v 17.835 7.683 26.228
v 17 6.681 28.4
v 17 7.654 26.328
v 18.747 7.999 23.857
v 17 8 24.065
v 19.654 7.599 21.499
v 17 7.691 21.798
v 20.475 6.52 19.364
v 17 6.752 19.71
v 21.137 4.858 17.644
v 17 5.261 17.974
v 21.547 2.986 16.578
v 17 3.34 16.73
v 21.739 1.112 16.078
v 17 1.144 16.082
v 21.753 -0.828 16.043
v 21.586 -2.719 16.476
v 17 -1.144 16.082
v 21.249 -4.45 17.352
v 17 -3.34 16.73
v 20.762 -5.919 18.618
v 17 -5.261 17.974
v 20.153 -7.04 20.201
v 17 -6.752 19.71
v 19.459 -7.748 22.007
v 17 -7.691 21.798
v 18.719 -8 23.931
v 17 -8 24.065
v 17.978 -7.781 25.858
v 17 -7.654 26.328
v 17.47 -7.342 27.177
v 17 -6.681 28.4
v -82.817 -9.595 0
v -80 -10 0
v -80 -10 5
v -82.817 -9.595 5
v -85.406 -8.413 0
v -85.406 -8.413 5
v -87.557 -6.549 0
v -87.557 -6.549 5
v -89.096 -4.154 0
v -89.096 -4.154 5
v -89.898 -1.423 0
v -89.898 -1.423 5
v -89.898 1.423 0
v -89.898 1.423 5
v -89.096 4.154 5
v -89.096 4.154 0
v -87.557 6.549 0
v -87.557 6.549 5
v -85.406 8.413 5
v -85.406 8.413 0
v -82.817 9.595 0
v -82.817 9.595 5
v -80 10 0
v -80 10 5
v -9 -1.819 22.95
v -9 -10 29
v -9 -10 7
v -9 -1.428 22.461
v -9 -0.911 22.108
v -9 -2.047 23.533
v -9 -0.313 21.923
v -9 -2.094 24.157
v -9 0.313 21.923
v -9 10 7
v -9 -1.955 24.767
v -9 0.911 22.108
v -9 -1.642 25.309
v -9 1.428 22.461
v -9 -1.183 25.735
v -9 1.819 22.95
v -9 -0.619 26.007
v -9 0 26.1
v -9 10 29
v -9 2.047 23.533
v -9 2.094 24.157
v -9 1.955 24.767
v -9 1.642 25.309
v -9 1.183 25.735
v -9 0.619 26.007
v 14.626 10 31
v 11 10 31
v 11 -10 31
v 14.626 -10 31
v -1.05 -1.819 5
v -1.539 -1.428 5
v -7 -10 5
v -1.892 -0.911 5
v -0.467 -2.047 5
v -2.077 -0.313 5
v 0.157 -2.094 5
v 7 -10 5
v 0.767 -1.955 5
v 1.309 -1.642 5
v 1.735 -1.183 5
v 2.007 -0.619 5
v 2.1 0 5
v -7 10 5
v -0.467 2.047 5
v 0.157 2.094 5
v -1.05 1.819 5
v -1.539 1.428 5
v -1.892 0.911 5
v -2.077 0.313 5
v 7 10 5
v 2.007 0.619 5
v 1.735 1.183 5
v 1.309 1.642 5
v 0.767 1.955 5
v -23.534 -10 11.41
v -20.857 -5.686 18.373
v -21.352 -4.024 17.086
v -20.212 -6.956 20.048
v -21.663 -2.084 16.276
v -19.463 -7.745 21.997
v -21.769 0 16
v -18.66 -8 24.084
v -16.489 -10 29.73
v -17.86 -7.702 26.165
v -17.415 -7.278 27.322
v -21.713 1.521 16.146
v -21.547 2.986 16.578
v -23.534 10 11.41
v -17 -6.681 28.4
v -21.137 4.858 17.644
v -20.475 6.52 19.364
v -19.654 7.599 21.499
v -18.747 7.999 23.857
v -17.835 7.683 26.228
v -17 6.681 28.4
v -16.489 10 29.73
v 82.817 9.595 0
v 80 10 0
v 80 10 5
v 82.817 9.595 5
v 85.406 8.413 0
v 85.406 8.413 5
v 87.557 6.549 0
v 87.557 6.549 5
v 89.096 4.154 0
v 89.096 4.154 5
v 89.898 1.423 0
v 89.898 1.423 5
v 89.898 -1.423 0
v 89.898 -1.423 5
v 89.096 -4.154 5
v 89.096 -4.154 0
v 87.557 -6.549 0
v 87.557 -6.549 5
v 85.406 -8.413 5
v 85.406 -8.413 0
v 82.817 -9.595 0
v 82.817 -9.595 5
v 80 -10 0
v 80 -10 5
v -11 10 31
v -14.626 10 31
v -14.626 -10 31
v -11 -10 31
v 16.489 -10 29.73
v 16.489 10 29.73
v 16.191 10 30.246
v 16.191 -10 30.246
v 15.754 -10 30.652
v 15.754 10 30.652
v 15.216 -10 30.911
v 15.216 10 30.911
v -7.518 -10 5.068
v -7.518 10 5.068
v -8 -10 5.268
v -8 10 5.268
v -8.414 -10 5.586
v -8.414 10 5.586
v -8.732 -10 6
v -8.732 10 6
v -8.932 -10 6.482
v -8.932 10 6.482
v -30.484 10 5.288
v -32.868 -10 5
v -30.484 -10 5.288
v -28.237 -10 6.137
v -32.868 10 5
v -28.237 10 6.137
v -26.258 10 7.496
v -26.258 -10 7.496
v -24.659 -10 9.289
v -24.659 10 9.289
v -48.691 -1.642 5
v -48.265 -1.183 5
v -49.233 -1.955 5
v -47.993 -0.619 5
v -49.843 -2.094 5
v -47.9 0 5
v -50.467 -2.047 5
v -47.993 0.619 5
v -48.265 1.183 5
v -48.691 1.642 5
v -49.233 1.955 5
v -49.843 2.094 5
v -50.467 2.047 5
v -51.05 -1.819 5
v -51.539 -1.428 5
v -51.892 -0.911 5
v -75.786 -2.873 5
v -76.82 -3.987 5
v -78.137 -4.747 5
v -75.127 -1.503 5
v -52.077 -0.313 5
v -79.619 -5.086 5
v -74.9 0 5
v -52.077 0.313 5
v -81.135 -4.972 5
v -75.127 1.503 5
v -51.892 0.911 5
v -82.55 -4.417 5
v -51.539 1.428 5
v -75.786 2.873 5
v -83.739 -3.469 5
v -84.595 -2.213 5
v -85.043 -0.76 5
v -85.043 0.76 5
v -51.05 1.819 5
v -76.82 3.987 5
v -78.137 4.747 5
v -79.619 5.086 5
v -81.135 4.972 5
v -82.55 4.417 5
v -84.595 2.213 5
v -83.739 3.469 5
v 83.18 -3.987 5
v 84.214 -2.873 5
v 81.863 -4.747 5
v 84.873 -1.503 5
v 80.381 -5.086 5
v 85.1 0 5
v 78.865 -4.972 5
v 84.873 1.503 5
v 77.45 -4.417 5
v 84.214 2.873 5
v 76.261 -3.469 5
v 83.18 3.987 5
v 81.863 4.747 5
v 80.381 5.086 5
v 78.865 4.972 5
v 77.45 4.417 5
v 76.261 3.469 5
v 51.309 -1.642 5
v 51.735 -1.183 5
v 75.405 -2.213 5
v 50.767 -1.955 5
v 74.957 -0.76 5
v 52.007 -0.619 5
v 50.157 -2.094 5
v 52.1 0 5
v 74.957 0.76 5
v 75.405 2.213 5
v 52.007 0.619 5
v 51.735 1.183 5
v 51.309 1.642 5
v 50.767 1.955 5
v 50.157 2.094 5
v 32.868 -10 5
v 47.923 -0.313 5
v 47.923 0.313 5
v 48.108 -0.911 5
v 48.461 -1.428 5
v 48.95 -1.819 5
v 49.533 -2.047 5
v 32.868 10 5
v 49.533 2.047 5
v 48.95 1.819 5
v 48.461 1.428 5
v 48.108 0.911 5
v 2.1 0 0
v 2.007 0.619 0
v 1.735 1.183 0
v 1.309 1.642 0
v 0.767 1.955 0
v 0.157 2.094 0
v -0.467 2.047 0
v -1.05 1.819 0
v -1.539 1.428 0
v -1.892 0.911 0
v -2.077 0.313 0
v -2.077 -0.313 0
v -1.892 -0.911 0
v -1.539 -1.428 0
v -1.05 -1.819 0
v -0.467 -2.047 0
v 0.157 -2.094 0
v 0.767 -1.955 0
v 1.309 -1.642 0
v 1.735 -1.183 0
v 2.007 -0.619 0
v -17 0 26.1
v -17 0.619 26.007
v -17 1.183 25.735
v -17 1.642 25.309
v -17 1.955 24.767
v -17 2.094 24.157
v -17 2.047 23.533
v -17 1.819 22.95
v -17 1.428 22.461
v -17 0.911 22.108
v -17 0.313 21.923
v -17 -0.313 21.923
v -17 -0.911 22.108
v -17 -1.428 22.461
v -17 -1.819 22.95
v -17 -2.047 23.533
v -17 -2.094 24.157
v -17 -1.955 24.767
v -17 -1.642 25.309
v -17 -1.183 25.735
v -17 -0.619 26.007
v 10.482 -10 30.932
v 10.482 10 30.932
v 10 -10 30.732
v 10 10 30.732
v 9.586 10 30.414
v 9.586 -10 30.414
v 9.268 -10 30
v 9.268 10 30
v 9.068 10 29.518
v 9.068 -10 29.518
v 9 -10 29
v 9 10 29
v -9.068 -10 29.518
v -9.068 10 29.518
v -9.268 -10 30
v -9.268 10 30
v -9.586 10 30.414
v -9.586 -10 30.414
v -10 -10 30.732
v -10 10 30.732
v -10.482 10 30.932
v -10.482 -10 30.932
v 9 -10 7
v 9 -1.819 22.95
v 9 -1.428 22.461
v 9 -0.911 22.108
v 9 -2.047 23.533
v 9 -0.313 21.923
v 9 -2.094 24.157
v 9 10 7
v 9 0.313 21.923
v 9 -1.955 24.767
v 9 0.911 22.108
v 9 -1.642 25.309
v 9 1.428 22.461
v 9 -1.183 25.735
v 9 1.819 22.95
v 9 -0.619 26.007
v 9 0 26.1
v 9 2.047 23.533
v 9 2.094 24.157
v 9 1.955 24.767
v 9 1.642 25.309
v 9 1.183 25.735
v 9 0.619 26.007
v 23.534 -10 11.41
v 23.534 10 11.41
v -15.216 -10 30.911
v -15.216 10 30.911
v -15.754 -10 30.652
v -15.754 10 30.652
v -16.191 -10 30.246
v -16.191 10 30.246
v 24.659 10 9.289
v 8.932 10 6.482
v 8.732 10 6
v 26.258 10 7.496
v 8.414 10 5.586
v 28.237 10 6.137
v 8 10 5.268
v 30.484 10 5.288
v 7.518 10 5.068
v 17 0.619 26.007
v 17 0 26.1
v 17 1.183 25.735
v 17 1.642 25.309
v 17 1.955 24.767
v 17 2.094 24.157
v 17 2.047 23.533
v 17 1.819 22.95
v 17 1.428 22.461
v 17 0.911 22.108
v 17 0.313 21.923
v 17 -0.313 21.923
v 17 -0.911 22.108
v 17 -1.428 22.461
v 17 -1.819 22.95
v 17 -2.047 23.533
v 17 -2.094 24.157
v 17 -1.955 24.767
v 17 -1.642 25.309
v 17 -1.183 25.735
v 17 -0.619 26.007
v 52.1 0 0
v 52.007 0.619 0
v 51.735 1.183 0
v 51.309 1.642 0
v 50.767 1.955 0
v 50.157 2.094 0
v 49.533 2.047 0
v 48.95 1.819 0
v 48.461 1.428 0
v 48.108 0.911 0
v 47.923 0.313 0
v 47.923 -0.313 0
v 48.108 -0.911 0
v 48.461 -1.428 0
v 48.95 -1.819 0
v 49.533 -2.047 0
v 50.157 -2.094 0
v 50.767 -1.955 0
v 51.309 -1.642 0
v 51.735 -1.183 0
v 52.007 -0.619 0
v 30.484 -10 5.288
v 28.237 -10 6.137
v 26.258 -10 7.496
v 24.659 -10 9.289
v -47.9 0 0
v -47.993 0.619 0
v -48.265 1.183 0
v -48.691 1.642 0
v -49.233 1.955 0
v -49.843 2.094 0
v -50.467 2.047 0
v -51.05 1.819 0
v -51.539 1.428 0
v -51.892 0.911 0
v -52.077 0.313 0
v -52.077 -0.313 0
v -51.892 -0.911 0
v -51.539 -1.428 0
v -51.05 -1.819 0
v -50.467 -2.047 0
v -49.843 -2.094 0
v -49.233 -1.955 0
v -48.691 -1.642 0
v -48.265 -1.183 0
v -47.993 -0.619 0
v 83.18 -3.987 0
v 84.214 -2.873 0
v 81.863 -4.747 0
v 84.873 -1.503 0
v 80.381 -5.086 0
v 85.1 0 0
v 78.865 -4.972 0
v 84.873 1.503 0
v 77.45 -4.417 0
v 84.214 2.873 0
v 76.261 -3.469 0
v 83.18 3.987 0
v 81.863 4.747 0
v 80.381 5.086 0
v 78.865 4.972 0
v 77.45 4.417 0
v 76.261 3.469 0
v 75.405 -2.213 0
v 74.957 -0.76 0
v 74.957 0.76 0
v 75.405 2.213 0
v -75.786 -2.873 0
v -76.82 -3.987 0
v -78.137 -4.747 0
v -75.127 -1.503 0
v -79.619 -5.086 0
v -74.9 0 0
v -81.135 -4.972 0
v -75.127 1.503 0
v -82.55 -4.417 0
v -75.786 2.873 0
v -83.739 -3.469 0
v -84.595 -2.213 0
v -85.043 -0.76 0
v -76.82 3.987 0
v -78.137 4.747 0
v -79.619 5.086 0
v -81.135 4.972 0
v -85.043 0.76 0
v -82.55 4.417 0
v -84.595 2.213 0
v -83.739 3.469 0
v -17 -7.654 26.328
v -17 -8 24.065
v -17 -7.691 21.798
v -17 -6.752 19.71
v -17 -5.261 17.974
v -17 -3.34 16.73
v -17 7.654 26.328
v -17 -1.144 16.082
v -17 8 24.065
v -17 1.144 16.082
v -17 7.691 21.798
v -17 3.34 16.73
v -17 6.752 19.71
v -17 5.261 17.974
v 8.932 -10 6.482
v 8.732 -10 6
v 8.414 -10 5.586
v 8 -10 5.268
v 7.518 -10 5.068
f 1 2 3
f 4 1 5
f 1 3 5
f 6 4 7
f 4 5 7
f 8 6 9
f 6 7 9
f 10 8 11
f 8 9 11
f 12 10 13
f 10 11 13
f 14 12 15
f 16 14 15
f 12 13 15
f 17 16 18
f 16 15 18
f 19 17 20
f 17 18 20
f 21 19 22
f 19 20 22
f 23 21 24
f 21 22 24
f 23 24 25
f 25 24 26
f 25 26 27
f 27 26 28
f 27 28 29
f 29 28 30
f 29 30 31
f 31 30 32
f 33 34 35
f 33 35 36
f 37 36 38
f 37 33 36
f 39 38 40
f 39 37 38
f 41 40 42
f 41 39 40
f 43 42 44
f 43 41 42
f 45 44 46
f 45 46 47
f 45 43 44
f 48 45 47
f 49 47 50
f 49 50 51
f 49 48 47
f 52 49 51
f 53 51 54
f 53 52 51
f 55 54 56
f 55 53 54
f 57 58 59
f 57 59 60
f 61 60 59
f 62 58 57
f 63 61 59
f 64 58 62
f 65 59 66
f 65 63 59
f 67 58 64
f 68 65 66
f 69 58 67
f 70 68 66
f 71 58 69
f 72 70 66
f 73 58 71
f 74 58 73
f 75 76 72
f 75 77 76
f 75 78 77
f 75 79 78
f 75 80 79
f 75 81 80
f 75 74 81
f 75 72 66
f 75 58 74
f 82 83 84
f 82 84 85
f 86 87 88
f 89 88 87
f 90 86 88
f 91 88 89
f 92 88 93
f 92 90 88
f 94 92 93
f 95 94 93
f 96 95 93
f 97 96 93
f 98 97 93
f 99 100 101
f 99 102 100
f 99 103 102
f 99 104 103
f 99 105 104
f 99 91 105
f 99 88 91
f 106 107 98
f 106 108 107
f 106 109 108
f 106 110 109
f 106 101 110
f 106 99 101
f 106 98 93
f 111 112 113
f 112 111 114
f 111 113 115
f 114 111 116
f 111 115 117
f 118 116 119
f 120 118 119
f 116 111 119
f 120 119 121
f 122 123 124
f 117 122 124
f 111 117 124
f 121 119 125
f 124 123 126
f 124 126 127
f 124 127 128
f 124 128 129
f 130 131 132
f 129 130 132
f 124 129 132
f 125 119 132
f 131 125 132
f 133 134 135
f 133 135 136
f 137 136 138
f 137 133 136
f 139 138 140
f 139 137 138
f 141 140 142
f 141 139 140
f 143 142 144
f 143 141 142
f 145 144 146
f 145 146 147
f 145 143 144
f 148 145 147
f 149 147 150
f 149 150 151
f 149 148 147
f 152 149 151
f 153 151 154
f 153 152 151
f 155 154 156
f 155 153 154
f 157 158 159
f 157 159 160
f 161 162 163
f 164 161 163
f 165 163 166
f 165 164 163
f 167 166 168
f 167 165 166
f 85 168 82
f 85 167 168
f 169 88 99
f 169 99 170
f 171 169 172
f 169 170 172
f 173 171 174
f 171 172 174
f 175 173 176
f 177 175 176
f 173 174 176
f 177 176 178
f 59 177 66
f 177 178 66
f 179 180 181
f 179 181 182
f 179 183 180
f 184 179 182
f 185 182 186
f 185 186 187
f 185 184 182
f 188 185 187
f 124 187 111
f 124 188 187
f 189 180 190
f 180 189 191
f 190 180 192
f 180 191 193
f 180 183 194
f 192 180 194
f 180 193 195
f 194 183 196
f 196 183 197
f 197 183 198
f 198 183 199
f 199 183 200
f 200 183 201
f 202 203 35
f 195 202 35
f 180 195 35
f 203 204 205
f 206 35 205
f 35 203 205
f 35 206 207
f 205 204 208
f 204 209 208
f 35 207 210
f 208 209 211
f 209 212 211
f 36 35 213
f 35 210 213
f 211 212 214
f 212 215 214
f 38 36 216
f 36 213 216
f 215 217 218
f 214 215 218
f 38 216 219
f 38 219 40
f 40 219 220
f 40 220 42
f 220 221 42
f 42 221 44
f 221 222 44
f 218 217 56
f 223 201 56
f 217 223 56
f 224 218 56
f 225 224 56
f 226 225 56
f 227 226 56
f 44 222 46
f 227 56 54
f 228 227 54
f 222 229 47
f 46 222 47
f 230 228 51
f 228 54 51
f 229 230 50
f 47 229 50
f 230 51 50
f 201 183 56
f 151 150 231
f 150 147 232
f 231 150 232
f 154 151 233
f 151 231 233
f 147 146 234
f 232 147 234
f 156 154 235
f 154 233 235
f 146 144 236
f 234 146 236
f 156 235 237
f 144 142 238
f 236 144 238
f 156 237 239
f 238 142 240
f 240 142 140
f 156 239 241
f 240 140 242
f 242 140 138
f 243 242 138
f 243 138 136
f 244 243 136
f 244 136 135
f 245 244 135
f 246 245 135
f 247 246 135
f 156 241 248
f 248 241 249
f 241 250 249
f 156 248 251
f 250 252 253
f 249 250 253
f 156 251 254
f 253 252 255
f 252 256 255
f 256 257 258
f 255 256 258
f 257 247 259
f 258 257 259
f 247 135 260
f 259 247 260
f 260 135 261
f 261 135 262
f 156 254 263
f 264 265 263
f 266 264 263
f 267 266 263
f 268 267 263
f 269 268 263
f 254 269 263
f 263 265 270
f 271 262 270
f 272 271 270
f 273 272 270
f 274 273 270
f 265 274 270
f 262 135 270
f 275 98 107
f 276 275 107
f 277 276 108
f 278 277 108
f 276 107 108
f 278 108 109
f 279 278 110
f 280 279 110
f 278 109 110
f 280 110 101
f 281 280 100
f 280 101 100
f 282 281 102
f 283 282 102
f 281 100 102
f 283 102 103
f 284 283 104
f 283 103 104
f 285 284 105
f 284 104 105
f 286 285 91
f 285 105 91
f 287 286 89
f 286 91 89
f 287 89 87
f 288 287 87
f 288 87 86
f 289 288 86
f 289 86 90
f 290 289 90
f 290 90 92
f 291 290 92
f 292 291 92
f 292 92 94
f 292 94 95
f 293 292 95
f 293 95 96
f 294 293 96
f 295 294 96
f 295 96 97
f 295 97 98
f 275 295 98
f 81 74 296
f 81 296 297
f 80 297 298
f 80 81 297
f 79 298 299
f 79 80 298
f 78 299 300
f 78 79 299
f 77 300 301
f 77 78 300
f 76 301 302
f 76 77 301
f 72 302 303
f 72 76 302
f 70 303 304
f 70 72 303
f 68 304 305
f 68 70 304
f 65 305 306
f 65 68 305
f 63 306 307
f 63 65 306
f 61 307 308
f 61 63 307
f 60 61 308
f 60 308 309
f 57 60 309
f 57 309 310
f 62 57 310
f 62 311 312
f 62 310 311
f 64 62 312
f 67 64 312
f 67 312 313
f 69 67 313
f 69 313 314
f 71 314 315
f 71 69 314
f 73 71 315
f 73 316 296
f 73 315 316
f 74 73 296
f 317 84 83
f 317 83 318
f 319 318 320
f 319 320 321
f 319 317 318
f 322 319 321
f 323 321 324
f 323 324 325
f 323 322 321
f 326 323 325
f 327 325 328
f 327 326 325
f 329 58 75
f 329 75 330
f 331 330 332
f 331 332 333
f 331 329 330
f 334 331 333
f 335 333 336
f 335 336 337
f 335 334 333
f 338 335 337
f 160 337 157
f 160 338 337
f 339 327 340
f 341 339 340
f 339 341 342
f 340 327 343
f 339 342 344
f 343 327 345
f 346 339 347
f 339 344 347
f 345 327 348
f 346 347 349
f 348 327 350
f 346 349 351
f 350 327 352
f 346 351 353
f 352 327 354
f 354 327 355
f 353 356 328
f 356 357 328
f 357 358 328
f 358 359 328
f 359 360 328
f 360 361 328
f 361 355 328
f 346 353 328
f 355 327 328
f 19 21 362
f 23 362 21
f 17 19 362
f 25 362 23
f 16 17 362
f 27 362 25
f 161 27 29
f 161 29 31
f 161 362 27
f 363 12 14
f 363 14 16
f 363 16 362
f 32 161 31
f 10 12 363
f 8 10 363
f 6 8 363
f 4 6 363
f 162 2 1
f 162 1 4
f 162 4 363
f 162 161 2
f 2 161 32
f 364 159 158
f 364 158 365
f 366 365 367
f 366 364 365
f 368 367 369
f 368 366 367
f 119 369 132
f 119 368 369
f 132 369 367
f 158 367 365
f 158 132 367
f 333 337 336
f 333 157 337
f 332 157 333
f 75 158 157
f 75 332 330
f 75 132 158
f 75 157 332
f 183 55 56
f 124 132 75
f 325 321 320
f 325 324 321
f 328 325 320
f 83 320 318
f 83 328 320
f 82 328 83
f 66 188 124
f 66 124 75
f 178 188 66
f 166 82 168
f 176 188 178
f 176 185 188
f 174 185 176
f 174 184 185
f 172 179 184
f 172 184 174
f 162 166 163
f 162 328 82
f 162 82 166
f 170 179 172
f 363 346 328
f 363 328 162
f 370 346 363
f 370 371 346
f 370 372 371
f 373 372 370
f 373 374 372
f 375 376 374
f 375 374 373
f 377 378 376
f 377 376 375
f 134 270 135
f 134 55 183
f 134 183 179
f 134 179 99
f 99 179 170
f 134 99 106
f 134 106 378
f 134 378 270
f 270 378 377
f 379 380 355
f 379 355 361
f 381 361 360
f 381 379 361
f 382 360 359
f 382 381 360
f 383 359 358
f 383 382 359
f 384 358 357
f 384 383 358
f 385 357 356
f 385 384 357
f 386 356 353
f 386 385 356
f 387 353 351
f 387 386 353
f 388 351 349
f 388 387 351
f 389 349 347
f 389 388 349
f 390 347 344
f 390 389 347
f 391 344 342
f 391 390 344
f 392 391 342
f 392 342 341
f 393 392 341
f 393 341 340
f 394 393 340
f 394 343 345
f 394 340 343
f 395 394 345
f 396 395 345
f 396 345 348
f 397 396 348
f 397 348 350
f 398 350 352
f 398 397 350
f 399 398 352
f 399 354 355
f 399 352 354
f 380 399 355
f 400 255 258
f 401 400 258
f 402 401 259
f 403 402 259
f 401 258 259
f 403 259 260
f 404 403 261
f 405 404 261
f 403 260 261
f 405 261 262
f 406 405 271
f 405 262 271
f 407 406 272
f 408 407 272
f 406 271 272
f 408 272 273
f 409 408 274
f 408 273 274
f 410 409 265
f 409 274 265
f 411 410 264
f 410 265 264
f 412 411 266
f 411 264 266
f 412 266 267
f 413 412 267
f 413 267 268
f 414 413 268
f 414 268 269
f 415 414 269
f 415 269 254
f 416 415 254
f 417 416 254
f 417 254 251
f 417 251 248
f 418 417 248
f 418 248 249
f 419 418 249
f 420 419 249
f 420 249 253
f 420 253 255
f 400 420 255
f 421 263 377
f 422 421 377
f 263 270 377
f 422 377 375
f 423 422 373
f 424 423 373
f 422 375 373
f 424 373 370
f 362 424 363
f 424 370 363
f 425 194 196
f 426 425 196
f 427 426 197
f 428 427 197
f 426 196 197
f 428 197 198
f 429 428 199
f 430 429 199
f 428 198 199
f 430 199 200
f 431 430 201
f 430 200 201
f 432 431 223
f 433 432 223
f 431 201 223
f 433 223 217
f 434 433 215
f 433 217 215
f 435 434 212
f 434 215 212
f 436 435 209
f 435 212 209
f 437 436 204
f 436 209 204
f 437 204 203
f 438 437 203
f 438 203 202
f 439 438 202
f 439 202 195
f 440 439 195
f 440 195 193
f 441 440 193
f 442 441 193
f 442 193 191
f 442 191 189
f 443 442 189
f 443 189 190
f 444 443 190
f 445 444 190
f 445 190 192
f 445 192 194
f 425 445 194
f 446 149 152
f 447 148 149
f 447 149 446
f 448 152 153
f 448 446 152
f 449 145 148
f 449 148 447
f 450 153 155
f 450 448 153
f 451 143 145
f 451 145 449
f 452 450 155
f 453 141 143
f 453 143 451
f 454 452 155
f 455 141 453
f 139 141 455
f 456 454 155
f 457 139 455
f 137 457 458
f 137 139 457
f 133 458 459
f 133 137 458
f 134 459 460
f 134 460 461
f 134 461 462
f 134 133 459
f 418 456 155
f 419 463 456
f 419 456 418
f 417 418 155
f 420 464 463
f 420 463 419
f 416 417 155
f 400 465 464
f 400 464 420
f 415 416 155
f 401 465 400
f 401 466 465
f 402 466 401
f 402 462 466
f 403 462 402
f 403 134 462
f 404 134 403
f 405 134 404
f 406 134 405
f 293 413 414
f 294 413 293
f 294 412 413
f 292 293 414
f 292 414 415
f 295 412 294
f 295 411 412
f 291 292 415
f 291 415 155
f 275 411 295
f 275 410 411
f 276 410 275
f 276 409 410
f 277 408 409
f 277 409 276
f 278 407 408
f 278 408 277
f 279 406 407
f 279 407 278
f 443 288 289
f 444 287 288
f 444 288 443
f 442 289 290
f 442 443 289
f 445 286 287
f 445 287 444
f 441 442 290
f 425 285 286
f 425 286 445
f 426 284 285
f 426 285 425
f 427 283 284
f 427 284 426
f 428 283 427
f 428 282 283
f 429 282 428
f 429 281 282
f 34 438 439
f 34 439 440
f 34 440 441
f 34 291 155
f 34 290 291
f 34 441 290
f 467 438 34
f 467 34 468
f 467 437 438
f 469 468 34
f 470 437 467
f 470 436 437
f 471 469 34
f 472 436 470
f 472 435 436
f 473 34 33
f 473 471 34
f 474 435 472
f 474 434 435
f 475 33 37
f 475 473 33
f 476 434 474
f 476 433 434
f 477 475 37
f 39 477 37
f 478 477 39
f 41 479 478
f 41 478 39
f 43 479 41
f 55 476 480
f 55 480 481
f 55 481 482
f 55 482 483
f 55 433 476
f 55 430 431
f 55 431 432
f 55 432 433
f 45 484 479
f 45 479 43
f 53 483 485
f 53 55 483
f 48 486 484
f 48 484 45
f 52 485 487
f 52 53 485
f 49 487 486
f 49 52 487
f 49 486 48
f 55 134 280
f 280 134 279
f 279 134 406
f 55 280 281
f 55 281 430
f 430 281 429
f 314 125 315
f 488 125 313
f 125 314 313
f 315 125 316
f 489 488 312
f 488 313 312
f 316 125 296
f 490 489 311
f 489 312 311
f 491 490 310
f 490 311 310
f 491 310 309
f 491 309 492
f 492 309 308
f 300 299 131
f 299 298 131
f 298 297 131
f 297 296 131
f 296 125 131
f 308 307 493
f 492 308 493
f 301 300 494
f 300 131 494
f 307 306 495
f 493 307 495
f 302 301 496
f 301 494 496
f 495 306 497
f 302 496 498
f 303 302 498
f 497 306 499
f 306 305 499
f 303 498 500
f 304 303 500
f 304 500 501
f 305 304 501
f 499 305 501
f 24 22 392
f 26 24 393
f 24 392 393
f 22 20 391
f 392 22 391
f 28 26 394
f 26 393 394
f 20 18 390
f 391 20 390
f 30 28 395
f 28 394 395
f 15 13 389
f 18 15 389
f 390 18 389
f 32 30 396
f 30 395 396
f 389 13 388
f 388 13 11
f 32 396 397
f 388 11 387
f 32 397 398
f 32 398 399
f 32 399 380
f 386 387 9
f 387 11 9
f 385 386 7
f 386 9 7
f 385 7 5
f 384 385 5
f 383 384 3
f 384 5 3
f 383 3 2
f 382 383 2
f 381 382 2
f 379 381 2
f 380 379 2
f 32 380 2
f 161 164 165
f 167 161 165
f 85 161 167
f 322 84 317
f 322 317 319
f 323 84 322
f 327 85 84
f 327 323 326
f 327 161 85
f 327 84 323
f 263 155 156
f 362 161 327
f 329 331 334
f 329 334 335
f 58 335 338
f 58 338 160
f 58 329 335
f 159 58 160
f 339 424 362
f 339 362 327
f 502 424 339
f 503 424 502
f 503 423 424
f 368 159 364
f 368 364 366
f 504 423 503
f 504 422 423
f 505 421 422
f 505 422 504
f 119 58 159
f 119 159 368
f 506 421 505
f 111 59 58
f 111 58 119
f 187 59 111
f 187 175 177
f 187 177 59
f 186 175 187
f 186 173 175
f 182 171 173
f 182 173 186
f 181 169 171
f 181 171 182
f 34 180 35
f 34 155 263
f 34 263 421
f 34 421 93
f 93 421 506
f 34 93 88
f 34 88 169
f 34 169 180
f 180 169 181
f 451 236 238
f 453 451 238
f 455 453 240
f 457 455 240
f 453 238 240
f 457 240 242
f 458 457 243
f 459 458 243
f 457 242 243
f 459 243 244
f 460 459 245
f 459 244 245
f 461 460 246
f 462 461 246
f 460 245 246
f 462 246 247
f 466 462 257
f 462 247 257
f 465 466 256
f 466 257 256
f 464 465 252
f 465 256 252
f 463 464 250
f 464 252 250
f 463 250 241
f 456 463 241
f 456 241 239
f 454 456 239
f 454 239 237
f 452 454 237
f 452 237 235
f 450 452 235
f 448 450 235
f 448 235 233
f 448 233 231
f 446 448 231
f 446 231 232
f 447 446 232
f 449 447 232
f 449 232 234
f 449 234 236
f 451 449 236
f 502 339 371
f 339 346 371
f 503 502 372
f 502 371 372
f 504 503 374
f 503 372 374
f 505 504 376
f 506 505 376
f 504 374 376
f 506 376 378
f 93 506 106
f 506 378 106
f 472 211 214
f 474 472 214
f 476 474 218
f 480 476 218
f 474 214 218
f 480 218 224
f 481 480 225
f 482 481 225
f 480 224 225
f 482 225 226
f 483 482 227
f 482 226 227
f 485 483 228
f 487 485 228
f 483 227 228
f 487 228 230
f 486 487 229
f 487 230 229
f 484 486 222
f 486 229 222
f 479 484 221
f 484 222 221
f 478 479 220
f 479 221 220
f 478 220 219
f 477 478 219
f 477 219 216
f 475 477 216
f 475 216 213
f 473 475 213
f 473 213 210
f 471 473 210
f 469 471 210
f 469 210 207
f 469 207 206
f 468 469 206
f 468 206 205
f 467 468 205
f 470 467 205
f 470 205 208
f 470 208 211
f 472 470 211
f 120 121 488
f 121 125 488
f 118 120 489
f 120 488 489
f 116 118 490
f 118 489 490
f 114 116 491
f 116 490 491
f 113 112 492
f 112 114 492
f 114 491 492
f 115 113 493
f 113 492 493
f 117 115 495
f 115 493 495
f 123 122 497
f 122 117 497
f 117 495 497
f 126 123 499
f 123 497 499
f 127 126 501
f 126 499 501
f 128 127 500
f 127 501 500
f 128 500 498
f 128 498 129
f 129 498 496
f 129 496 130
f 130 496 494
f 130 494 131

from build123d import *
from OCP.BRepFilletAPI import BRepFilletAPI_MakeChamfer

# Parameters (mm, degrees)
BOSS_EXTRU_1_DEPTH           = 5
ESQUISSE2_R                  = 5.1
ESQUISSE2_R_2                = 2.1
ENL_V_MAT_EXTRU_1_DEPTH      = 91.691785736
ESQUISSE3_W                  = 32
ESQUISSE3_H                  = 20
BOSS_EXTRU_2_DEPTH           = 26
CHANFREIN1_SIZE              = 10
CHANFREIN1_SIZE_2            = 26
CONG_1_R                     = 10
ESQUISSE4_W                  = 18
ESQUISSE4_H                  = 20
ENL_V_MAT_EXTRU_2_DEPTH      = 26
CONG_2_R                     = 2
ENL_V_MAT_EXTRU_3_DEPTH      = 105.220919205
ENL_V_MAT_EXTRU_3_DEPTH_BACK = 105.220919205
ESQUISSE5_R                  = 2.1
ENL_V_START                  = -8
ESQUISSE6_R                  = 8
ENL_V_MAT_EXTRU_4_DEPTH      = 26
ESQUISSE7_R                  = 8
ENL_V_MAT_EXTRU_5_DEPTH      = 97.220919205
CONG_3_START                 = -11
CONG_3_DEPTH                 = 22
SKETCH1_R                    = 2.1
CUT_EXTRUDE1_DEPTH           = 95.212525707


with BuildPart() as part:
    # Esquisse1 → Boss.-Extru.1 (new body)
    with BuildSketch(Plane.XY):
        with BuildLine():
            Line((-80, 10), (80, 10))
            ThreePointArc((80, 10), (90, 0), (80, -10))
            Line((80, -10), (-80, -10))
            ThreePointArc((-80, -10), (-90, 0), (-80, 10))
        make_face()
    extrude(amount=BOSS_EXTRU_1_DEPTH)

    # Esquisse2 → Enlèv. mat.-Extru.1 (cut, through all)
    with BuildSketch(Plane.XY.offset(5)):
        with Locations((-80, 0)):
            Circle(ESQUISSE2_R)
        with Locations((80, 0)):
            Circle(ESQUISSE2_R)
        with Locations((-50, 0)):
            Circle(ESQUISSE2_R_2)
        with Locations((50, 0)):
            Circle(ESQUISSE2_R_2)
    extrude(amount=-ENL_V_MAT_EXTRU_1_DEPTH, mode=Mode.SUBTRACT)

    # Esquisse3 → Boss.-Extru.2 (add)
    with BuildSketch(Plane.XY.offset(5)):
        Rectangle(ESQUISSE3_W, ESQUISSE3_H)
    extrude(amount=BOSS_EXTRU_2_DEPTH)

    # Chanfrein1
    chanfrein1_edges_1 = [part.edges().sort_by_distance(p)[0] for p in [
        (16, 0, 5),
    ]]
    chanfrein1_side_1 = [part.faces().sort_by_distance(p)[0] for p in [
        (16.2, 0, 5),
    ]]
    chanfrein1_edges_2 = [part.edges().sort_by_distance(p)[0] for p in [
        (-16, 0, 5),
    ]]
    chanfrein1_side_2 = [part.faces().sort_by_distance(p)[0] for p in [
        (-16.2, 0, 5),
    ]]
    chanfrein1 = BRepFilletAPI_MakeChamfer(part.part.solid().wrapped)
    for e in chanfrein1_edges_1:
        chanfrein1.Add(CHANFREIN1_SIZE - 0.0001, CHANFREIN1_SIZE_2 - 0.0001, e.wrapped, chanfrein1_side_1[0].wrapped)
    for e in chanfrein1_edges_2:
        chanfrein1.Add(CHANFREIN1_SIZE - 0.0001, CHANFREIN1_SIZE_2 - 0.0001, e.wrapped, chanfrein1_side_2[0].wrapped)
    add(Compound.cast(chanfrein1.Shape()), mode=Mode.REPLACE)  # a hair under: the kernel refuses the full size

    # Congé1
    cong_1_edges = [part.edges().sort_by_distance(p)[0] for p in [
        (25.9999, 0, 5),
        (-25.9999, 0, 5),
    ]]
    fillet(cong_1_edges, radius=CONG_1_R)

    # Esquisse4 → Enlèv. mat.-Extru.2 (cut)
    with BuildSketch(Plane.XY.offset(31)):
        Rectangle(ESQUISSE4_W, ESQUISSE4_H)
    extrude(amount=-ENL_V_MAT_EXTRU_2_DEPTH, mode=Mode.SUBTRACT)

    # Congé2
    cong_2_edges = [part.edges().sort_by_distance(p)[0] for p in [
        (9, 0, 5),
        (-9, 0, 5),
    ]]
    fillet(cong_2_edges, radius=CONG_2_R)

    # Esquisse5 → Enlèv. mat.-Extru.3 (cut, two sides: drawn at the far end of the back side and taken through both)
    with BuildSketch(Plane.ZY.offset(-9).offset(-ENL_V_MAT_EXTRU_3_DEPTH_BACK)):
        with Locations((24, 0)):
            Circle(ESQUISSE5_R)
    extrude(amount=ENL_V_MAT_EXTRU_3_DEPTH + ENL_V_MAT_EXTRU_3_DEPTH_BACK, mode=Mode.SUBTRACT)

    # Esquisse6 → Enlèv. mat.-Extru.4 (cut)
    with BuildSketch(Plane.ZY.offset(-9).offset(ENL_V_START)):
        with Locations((24, 0)):
            Circle(ESQUISSE6_R)
    extrude(amount=-ENL_V_MAT_EXTRU_4_DEPTH, mode=Mode.SUBTRACT)

    # Esquisse7 → Enlèv. mat.-Extru.5 (cut, through all)
    with BuildSketch(Plane(origin=(-9, 0, 0), x_dir=(0, 0, -1), z_dir=(1, 0, 0)).offset(ENL_V_START)):
        with Locations((-24, 0)):
            Circle(ESQUISSE7_R)
    extrude(amount=-ENL_V_MAT_EXTRU_5_DEPTH, mode=Mode.SUBTRACT)

    # Congé3: read off the stored shape, not the designer's step
    # Congé3 outline → Congé3 (cut)
    with BuildSketch(Plane(origin=(0, 0, 0), x_dir=(1, 0, 0), z_dir=(0, 1, 0)).offset(CONG_3_START)):
        with BuildLine():
            Line((-9, -31), (-9, -29))
            ThreePointArc((-9, -29), (-9.585786438, -30.414213562), (-11, -31))
            Line((-11, -31), (-9, -31))
        make_face()
        with BuildLine():
            Line((-16, -31), (-14.626401804, -31))
            ThreePointArc((-14.626401804, -31), (-15.758674669, -30.64862311), (-16.493093016, -29.717958159))
            Line((-16.493093016, -29.717958159), (-16, -31))
        make_face()
        with BuildLine():
            ThreePointArc((16.493093016, -29.717958159), (15.758674669, -30.64862311), (14.626401804, -31))
            Line((14.626401804, -31), (16, -31))
            Line((16, -31), (16.493093016, -29.717958159))
        make_face()
        with BuildLine():
            ThreePointArc((11, -31), (9.585786438, -30.414213562), (9, -29))
            Line((9, -29), (9, -31))
            Line((9, -31), (11, -31))
        make_face()
    extrude(amount=CONG_3_DEPTH, mode=Mode.SUBTRACT)

    # Sketch1 → Cut-Extrude1 (cut, through all)
    with BuildSketch(Plane.XY.offset(5)):
        Circle(SKETCH1_R)
    extrude(amount=-CUT_EXTRUDE1_DEPTH, mode=Mode.SUBTRACT)


solid = part.part
